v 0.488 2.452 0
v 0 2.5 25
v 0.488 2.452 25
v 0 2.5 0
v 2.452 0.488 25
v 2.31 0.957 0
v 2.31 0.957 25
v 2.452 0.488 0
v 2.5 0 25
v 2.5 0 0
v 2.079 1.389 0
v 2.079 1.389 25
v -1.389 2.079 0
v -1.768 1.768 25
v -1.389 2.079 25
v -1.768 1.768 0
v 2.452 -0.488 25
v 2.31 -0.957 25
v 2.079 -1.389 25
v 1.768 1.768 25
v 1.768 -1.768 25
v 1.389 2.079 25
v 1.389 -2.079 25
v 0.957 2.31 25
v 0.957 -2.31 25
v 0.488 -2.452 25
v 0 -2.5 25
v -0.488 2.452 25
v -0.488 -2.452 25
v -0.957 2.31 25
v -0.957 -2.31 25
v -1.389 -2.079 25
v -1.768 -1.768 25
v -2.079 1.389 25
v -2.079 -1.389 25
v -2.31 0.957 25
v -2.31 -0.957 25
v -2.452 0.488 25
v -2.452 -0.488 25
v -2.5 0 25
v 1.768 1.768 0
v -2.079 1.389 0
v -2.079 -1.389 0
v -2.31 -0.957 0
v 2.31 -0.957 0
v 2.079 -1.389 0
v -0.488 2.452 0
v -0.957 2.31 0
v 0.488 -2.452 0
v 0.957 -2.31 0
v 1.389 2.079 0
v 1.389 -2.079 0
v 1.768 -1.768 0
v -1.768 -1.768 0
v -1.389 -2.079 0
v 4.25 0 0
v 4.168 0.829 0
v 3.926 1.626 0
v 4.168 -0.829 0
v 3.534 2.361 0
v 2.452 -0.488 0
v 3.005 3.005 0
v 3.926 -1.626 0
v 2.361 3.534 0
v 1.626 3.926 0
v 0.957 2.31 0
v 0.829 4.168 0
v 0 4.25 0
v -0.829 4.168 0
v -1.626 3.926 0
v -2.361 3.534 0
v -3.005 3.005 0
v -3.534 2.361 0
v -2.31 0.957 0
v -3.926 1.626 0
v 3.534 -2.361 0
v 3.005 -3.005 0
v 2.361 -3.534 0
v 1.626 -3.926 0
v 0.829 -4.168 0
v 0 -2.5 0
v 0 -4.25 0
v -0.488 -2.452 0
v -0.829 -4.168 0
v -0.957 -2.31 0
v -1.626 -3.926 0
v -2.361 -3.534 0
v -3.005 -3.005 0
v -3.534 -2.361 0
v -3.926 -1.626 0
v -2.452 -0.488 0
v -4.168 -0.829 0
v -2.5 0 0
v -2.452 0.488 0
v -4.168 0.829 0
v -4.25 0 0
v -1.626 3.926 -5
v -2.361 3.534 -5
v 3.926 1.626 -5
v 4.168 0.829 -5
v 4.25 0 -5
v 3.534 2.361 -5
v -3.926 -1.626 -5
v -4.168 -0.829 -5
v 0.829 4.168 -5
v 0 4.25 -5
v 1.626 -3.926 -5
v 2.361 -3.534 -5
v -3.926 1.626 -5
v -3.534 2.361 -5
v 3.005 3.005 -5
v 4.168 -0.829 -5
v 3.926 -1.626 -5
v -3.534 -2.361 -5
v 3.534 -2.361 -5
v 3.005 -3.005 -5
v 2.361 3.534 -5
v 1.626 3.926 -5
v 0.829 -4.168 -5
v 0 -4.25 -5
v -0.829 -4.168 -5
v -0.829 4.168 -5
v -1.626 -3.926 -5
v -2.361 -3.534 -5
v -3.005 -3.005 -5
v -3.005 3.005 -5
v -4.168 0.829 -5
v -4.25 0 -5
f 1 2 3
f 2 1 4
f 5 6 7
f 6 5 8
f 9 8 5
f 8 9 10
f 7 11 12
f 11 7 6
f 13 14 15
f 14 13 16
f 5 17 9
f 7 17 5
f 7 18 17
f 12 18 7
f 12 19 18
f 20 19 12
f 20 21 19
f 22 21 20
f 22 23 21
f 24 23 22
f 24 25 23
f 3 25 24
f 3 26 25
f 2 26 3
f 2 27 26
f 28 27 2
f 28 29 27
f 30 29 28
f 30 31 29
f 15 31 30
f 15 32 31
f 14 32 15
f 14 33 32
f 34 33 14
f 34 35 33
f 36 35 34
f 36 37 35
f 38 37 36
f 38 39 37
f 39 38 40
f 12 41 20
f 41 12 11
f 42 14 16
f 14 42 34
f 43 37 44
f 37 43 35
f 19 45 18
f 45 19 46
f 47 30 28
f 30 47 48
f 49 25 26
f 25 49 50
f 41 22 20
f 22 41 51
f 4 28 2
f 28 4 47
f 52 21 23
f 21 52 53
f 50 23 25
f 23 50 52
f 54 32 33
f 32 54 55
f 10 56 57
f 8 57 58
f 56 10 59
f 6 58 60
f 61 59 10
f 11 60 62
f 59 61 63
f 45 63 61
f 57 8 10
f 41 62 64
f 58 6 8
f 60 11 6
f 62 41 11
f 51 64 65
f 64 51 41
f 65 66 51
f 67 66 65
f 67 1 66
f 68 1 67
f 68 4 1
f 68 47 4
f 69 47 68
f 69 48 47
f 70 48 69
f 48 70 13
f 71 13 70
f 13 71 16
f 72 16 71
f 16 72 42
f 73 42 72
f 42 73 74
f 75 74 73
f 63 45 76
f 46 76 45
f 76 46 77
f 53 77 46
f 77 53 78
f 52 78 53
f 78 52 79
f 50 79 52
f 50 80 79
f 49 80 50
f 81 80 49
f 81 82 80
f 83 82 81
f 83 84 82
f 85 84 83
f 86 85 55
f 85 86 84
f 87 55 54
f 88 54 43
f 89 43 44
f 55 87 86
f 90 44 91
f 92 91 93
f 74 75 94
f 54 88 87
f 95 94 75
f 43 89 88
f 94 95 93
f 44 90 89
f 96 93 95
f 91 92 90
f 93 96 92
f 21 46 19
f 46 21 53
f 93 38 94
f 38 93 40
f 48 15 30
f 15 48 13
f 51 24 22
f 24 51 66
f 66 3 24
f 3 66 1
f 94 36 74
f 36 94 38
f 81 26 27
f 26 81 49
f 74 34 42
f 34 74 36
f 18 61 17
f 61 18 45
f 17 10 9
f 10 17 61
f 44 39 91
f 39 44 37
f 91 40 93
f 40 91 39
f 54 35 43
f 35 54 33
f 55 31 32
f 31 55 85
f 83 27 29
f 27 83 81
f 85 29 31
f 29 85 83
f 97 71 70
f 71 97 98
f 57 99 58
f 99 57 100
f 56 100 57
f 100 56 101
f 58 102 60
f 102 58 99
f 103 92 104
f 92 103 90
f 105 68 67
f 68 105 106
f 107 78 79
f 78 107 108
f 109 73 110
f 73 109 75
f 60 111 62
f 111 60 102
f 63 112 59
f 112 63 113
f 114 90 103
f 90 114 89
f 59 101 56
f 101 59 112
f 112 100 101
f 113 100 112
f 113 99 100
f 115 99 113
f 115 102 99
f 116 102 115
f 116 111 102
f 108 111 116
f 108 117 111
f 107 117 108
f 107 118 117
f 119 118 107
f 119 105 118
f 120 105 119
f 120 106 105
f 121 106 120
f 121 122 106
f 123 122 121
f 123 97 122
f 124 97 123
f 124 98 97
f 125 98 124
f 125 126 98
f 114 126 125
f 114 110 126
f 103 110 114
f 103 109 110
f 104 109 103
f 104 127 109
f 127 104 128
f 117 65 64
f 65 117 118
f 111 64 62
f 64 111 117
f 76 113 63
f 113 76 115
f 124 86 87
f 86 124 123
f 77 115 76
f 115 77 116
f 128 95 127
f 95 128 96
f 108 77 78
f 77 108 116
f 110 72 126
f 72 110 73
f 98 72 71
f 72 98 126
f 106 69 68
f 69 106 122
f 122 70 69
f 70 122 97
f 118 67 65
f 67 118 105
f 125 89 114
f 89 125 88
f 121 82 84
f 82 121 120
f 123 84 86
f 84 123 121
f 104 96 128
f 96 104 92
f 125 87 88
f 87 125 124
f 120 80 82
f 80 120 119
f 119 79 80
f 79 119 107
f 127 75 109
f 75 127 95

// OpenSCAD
// Purchased hardware envelope; no modeled threads, not print.
$fn=32;
union(){cylinder(d=5,h=25);translate([0,0,-5])cylinder(d=8.5,h=5);}
